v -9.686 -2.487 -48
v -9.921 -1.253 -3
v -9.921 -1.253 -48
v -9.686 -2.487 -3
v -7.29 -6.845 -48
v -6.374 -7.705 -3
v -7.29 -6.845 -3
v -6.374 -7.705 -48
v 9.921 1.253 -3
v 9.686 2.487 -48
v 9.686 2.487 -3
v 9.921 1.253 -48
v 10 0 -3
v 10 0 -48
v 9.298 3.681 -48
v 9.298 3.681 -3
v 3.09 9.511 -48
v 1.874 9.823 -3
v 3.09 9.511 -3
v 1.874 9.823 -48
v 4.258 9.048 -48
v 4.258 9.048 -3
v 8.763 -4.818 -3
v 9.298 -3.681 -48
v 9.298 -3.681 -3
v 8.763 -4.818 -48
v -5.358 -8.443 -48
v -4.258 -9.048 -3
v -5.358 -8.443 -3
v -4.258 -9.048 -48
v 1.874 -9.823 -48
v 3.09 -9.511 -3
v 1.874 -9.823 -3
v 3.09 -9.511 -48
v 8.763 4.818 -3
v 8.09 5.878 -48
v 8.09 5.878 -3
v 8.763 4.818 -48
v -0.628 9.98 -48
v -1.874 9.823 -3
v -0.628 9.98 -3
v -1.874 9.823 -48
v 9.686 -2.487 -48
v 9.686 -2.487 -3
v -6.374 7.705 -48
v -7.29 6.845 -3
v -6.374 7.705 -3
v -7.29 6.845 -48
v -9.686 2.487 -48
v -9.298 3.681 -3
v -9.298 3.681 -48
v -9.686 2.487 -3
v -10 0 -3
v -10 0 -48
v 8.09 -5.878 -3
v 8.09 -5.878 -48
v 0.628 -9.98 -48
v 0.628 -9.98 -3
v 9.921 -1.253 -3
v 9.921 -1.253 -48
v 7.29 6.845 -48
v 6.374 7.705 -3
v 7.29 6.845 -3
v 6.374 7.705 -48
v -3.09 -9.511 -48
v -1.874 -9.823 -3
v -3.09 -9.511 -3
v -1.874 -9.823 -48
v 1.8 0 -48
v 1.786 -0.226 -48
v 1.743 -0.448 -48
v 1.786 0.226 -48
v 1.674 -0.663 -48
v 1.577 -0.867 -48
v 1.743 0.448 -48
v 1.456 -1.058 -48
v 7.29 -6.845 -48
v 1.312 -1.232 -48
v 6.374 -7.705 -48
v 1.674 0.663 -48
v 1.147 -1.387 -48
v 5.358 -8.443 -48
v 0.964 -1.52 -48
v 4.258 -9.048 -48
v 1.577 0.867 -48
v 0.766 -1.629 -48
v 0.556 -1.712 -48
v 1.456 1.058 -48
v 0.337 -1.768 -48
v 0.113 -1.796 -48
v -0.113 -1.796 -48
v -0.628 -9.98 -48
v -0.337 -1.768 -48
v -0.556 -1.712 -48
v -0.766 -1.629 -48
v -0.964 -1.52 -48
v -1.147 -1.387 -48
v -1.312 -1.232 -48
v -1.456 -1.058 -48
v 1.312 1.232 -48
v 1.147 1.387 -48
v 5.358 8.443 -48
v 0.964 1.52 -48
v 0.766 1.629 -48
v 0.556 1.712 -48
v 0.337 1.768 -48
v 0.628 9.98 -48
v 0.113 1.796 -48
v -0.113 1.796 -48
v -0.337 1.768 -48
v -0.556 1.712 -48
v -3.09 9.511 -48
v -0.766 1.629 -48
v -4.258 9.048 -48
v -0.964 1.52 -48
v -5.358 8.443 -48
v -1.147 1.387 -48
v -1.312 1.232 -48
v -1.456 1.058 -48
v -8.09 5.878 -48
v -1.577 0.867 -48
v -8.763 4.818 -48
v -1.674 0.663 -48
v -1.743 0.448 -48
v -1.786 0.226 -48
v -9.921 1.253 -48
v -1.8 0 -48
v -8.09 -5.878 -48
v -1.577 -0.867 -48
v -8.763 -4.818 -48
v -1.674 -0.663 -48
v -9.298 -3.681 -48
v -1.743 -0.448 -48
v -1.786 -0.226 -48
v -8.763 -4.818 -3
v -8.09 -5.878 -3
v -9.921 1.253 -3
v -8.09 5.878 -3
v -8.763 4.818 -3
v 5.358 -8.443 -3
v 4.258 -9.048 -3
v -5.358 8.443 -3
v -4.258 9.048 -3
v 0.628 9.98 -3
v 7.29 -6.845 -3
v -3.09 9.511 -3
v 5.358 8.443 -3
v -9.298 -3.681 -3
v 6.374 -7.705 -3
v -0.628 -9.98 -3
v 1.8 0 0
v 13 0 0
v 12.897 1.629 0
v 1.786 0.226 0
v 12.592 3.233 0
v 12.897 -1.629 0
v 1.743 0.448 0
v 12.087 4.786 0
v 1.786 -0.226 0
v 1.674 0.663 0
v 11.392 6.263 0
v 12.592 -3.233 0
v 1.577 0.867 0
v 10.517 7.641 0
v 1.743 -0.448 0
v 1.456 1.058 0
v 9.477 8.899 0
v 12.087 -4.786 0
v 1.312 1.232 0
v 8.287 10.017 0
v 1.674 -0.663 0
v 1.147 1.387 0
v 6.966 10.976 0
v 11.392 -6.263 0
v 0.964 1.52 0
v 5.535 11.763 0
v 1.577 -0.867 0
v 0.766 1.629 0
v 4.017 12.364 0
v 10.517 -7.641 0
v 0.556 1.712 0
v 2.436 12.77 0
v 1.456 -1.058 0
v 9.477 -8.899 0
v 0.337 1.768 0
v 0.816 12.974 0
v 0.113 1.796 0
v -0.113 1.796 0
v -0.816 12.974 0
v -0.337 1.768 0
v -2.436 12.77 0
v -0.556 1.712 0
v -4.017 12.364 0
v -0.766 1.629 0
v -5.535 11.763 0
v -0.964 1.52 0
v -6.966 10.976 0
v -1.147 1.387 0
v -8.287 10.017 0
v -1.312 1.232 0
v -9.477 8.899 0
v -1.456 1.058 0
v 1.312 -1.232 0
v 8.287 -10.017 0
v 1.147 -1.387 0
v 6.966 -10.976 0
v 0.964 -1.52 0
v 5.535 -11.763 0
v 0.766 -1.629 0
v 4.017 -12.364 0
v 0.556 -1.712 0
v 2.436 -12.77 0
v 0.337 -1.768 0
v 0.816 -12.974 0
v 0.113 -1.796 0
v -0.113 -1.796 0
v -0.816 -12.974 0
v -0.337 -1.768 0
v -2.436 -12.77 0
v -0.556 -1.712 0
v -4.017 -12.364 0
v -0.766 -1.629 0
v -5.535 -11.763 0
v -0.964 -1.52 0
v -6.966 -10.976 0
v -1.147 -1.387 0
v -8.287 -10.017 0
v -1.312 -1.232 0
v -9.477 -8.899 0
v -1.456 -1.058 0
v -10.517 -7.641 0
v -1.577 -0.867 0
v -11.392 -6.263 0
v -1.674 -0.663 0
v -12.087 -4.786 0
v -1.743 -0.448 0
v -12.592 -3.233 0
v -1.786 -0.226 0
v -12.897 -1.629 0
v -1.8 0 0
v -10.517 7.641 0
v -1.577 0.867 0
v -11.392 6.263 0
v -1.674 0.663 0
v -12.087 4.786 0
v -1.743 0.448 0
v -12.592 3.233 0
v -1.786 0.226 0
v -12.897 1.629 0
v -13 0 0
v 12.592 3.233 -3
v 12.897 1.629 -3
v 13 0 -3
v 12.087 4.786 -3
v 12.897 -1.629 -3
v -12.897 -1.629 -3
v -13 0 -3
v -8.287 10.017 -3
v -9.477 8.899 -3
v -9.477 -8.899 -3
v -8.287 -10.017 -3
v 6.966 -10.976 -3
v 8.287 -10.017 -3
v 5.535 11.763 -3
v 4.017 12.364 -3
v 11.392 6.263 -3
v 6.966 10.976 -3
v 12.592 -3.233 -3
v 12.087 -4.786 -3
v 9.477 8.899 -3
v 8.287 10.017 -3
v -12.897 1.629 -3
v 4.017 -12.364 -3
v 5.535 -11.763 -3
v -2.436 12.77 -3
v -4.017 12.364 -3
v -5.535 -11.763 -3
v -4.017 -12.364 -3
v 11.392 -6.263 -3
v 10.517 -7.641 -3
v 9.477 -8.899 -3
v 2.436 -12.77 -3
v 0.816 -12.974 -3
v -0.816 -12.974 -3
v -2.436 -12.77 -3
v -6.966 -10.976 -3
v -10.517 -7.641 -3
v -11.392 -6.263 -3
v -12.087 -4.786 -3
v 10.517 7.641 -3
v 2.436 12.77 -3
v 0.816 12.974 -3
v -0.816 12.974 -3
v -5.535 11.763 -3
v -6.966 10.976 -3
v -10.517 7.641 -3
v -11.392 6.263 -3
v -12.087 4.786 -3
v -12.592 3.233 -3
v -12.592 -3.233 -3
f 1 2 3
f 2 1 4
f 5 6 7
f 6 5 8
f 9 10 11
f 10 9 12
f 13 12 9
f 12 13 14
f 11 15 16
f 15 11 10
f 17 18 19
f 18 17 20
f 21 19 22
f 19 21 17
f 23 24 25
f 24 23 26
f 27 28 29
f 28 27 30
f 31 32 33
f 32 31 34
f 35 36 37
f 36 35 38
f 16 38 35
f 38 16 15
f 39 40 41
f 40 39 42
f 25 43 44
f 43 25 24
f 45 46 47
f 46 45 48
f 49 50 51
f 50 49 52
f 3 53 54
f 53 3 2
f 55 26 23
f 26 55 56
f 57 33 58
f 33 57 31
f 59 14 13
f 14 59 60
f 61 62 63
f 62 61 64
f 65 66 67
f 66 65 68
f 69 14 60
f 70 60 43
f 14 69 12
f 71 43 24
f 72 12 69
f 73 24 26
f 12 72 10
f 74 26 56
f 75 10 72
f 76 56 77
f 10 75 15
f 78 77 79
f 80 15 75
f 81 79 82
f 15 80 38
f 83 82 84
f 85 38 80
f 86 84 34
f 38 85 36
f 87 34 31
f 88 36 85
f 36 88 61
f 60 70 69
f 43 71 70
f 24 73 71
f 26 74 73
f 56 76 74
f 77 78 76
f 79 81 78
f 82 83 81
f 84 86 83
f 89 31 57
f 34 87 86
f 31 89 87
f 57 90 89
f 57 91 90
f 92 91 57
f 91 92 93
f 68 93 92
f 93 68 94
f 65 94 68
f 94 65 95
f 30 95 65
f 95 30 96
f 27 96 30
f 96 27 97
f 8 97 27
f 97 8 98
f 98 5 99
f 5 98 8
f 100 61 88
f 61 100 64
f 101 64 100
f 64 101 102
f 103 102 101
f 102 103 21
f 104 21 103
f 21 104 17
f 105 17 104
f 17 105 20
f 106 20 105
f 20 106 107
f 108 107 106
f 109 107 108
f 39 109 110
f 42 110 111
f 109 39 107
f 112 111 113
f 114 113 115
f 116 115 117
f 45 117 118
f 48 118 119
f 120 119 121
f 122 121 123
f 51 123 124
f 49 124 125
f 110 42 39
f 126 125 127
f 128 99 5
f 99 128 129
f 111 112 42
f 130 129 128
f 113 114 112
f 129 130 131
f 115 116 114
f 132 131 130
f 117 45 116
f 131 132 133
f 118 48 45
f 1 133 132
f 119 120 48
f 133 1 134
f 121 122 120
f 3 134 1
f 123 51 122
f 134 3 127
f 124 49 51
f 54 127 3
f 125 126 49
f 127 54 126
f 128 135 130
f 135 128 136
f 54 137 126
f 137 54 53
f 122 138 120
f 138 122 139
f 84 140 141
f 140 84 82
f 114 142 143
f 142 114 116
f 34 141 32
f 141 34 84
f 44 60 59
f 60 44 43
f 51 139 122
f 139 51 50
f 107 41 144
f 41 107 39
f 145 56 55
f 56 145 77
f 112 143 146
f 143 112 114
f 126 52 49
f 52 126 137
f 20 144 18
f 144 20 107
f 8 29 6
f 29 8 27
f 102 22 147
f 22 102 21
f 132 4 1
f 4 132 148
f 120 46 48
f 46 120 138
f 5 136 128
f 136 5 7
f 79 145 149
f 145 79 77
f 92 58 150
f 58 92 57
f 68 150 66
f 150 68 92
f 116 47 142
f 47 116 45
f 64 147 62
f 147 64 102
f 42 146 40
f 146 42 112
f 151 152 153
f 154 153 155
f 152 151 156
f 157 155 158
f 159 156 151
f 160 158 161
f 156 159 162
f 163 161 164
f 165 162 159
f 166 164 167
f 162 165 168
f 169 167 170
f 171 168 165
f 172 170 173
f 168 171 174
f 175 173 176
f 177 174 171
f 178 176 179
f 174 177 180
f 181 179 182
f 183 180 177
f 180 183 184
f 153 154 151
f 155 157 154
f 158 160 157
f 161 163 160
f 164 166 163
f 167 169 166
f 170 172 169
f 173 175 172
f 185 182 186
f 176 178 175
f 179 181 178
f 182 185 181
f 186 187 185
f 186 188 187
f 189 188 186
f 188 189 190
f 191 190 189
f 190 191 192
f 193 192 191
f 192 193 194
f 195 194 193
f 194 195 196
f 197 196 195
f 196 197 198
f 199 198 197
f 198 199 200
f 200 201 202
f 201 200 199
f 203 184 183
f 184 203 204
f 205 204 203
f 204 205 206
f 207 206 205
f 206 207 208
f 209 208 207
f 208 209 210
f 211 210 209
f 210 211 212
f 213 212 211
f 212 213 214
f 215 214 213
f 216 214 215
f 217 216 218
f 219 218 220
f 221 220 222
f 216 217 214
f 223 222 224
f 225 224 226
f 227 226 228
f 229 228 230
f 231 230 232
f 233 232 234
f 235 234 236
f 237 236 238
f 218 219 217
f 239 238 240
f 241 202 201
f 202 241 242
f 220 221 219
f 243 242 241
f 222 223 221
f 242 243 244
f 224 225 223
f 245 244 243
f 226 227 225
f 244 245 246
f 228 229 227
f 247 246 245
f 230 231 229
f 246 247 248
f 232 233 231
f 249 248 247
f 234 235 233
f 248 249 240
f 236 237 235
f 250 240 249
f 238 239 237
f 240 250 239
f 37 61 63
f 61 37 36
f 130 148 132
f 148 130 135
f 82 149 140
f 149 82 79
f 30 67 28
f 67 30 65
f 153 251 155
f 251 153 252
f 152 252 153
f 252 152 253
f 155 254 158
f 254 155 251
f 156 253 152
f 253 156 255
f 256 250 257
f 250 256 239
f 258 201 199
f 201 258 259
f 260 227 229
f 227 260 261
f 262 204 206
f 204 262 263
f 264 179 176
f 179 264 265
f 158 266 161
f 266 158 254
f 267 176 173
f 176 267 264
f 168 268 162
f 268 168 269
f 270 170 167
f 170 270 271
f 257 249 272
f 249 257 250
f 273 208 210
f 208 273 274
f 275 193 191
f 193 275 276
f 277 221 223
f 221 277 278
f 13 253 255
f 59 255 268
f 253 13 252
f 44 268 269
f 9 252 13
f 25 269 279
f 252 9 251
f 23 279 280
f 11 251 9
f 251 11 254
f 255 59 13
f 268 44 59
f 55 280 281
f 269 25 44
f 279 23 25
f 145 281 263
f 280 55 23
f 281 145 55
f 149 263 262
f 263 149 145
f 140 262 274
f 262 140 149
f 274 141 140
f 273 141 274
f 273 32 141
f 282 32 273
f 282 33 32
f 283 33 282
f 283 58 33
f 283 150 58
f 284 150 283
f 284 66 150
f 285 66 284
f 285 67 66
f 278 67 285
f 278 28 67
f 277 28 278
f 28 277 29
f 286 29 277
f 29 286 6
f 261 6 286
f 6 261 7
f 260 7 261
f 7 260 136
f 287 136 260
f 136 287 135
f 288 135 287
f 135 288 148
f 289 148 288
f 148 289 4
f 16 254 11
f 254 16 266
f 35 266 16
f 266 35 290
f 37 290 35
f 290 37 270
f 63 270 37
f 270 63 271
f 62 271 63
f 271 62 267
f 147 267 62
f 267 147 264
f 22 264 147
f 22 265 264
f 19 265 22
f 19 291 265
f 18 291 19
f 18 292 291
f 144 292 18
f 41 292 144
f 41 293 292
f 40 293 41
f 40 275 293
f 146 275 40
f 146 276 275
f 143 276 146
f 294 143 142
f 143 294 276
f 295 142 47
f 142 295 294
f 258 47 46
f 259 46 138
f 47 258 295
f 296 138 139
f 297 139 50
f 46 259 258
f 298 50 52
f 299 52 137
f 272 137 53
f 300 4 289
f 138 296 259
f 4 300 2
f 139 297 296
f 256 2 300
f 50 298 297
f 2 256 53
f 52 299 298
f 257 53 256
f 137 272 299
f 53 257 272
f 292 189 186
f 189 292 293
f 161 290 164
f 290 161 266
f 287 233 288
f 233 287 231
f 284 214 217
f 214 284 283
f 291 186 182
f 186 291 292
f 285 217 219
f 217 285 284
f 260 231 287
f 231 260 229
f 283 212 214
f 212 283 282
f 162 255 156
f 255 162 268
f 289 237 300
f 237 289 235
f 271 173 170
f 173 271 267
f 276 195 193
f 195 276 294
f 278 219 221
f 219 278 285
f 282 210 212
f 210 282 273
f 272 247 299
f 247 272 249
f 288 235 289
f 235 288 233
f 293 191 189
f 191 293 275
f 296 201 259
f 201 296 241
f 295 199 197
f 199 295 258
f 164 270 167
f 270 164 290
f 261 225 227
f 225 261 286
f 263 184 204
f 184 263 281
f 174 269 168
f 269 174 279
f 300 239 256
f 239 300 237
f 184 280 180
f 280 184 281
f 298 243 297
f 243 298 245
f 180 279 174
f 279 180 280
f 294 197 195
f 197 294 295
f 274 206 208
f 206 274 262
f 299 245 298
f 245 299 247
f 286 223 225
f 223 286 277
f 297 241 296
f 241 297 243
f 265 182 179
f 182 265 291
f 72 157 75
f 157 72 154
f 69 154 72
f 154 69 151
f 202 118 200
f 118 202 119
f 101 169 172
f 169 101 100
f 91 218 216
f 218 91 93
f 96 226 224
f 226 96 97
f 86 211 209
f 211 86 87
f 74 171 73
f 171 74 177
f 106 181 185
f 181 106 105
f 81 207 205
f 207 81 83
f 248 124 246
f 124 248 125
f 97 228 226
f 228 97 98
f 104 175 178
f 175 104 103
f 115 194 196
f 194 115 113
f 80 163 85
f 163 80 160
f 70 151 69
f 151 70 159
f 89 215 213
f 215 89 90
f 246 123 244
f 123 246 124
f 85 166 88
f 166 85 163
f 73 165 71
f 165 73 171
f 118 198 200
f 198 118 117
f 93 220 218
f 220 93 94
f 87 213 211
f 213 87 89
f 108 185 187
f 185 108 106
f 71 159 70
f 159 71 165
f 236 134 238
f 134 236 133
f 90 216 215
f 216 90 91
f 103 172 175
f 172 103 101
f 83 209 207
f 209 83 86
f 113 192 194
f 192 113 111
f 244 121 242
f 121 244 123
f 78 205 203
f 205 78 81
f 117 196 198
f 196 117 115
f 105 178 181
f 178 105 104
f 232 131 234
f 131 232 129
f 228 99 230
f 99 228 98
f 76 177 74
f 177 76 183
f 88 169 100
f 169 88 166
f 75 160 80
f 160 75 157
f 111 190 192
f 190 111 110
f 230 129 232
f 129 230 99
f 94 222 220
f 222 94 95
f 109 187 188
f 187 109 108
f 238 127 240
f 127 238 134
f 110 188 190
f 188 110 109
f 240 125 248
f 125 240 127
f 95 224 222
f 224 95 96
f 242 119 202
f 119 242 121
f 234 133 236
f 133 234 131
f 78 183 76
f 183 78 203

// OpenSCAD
$fn = 50;


difference() {
	union() {
		translate(v = [0, 0, -48.0000000000]) {
			cylinder(h = 48, r = 10.0000000000);
		}
		translate(v = [0, 0, -3.0000000000]) {
			cylinder(h = 3, r = 13.0000000000);
		}
	}
	union() {
		#translate(v = [0, 0, -48]) {
			cylinder(h = 48, r = 1.8000000000);
		}
	}
}
